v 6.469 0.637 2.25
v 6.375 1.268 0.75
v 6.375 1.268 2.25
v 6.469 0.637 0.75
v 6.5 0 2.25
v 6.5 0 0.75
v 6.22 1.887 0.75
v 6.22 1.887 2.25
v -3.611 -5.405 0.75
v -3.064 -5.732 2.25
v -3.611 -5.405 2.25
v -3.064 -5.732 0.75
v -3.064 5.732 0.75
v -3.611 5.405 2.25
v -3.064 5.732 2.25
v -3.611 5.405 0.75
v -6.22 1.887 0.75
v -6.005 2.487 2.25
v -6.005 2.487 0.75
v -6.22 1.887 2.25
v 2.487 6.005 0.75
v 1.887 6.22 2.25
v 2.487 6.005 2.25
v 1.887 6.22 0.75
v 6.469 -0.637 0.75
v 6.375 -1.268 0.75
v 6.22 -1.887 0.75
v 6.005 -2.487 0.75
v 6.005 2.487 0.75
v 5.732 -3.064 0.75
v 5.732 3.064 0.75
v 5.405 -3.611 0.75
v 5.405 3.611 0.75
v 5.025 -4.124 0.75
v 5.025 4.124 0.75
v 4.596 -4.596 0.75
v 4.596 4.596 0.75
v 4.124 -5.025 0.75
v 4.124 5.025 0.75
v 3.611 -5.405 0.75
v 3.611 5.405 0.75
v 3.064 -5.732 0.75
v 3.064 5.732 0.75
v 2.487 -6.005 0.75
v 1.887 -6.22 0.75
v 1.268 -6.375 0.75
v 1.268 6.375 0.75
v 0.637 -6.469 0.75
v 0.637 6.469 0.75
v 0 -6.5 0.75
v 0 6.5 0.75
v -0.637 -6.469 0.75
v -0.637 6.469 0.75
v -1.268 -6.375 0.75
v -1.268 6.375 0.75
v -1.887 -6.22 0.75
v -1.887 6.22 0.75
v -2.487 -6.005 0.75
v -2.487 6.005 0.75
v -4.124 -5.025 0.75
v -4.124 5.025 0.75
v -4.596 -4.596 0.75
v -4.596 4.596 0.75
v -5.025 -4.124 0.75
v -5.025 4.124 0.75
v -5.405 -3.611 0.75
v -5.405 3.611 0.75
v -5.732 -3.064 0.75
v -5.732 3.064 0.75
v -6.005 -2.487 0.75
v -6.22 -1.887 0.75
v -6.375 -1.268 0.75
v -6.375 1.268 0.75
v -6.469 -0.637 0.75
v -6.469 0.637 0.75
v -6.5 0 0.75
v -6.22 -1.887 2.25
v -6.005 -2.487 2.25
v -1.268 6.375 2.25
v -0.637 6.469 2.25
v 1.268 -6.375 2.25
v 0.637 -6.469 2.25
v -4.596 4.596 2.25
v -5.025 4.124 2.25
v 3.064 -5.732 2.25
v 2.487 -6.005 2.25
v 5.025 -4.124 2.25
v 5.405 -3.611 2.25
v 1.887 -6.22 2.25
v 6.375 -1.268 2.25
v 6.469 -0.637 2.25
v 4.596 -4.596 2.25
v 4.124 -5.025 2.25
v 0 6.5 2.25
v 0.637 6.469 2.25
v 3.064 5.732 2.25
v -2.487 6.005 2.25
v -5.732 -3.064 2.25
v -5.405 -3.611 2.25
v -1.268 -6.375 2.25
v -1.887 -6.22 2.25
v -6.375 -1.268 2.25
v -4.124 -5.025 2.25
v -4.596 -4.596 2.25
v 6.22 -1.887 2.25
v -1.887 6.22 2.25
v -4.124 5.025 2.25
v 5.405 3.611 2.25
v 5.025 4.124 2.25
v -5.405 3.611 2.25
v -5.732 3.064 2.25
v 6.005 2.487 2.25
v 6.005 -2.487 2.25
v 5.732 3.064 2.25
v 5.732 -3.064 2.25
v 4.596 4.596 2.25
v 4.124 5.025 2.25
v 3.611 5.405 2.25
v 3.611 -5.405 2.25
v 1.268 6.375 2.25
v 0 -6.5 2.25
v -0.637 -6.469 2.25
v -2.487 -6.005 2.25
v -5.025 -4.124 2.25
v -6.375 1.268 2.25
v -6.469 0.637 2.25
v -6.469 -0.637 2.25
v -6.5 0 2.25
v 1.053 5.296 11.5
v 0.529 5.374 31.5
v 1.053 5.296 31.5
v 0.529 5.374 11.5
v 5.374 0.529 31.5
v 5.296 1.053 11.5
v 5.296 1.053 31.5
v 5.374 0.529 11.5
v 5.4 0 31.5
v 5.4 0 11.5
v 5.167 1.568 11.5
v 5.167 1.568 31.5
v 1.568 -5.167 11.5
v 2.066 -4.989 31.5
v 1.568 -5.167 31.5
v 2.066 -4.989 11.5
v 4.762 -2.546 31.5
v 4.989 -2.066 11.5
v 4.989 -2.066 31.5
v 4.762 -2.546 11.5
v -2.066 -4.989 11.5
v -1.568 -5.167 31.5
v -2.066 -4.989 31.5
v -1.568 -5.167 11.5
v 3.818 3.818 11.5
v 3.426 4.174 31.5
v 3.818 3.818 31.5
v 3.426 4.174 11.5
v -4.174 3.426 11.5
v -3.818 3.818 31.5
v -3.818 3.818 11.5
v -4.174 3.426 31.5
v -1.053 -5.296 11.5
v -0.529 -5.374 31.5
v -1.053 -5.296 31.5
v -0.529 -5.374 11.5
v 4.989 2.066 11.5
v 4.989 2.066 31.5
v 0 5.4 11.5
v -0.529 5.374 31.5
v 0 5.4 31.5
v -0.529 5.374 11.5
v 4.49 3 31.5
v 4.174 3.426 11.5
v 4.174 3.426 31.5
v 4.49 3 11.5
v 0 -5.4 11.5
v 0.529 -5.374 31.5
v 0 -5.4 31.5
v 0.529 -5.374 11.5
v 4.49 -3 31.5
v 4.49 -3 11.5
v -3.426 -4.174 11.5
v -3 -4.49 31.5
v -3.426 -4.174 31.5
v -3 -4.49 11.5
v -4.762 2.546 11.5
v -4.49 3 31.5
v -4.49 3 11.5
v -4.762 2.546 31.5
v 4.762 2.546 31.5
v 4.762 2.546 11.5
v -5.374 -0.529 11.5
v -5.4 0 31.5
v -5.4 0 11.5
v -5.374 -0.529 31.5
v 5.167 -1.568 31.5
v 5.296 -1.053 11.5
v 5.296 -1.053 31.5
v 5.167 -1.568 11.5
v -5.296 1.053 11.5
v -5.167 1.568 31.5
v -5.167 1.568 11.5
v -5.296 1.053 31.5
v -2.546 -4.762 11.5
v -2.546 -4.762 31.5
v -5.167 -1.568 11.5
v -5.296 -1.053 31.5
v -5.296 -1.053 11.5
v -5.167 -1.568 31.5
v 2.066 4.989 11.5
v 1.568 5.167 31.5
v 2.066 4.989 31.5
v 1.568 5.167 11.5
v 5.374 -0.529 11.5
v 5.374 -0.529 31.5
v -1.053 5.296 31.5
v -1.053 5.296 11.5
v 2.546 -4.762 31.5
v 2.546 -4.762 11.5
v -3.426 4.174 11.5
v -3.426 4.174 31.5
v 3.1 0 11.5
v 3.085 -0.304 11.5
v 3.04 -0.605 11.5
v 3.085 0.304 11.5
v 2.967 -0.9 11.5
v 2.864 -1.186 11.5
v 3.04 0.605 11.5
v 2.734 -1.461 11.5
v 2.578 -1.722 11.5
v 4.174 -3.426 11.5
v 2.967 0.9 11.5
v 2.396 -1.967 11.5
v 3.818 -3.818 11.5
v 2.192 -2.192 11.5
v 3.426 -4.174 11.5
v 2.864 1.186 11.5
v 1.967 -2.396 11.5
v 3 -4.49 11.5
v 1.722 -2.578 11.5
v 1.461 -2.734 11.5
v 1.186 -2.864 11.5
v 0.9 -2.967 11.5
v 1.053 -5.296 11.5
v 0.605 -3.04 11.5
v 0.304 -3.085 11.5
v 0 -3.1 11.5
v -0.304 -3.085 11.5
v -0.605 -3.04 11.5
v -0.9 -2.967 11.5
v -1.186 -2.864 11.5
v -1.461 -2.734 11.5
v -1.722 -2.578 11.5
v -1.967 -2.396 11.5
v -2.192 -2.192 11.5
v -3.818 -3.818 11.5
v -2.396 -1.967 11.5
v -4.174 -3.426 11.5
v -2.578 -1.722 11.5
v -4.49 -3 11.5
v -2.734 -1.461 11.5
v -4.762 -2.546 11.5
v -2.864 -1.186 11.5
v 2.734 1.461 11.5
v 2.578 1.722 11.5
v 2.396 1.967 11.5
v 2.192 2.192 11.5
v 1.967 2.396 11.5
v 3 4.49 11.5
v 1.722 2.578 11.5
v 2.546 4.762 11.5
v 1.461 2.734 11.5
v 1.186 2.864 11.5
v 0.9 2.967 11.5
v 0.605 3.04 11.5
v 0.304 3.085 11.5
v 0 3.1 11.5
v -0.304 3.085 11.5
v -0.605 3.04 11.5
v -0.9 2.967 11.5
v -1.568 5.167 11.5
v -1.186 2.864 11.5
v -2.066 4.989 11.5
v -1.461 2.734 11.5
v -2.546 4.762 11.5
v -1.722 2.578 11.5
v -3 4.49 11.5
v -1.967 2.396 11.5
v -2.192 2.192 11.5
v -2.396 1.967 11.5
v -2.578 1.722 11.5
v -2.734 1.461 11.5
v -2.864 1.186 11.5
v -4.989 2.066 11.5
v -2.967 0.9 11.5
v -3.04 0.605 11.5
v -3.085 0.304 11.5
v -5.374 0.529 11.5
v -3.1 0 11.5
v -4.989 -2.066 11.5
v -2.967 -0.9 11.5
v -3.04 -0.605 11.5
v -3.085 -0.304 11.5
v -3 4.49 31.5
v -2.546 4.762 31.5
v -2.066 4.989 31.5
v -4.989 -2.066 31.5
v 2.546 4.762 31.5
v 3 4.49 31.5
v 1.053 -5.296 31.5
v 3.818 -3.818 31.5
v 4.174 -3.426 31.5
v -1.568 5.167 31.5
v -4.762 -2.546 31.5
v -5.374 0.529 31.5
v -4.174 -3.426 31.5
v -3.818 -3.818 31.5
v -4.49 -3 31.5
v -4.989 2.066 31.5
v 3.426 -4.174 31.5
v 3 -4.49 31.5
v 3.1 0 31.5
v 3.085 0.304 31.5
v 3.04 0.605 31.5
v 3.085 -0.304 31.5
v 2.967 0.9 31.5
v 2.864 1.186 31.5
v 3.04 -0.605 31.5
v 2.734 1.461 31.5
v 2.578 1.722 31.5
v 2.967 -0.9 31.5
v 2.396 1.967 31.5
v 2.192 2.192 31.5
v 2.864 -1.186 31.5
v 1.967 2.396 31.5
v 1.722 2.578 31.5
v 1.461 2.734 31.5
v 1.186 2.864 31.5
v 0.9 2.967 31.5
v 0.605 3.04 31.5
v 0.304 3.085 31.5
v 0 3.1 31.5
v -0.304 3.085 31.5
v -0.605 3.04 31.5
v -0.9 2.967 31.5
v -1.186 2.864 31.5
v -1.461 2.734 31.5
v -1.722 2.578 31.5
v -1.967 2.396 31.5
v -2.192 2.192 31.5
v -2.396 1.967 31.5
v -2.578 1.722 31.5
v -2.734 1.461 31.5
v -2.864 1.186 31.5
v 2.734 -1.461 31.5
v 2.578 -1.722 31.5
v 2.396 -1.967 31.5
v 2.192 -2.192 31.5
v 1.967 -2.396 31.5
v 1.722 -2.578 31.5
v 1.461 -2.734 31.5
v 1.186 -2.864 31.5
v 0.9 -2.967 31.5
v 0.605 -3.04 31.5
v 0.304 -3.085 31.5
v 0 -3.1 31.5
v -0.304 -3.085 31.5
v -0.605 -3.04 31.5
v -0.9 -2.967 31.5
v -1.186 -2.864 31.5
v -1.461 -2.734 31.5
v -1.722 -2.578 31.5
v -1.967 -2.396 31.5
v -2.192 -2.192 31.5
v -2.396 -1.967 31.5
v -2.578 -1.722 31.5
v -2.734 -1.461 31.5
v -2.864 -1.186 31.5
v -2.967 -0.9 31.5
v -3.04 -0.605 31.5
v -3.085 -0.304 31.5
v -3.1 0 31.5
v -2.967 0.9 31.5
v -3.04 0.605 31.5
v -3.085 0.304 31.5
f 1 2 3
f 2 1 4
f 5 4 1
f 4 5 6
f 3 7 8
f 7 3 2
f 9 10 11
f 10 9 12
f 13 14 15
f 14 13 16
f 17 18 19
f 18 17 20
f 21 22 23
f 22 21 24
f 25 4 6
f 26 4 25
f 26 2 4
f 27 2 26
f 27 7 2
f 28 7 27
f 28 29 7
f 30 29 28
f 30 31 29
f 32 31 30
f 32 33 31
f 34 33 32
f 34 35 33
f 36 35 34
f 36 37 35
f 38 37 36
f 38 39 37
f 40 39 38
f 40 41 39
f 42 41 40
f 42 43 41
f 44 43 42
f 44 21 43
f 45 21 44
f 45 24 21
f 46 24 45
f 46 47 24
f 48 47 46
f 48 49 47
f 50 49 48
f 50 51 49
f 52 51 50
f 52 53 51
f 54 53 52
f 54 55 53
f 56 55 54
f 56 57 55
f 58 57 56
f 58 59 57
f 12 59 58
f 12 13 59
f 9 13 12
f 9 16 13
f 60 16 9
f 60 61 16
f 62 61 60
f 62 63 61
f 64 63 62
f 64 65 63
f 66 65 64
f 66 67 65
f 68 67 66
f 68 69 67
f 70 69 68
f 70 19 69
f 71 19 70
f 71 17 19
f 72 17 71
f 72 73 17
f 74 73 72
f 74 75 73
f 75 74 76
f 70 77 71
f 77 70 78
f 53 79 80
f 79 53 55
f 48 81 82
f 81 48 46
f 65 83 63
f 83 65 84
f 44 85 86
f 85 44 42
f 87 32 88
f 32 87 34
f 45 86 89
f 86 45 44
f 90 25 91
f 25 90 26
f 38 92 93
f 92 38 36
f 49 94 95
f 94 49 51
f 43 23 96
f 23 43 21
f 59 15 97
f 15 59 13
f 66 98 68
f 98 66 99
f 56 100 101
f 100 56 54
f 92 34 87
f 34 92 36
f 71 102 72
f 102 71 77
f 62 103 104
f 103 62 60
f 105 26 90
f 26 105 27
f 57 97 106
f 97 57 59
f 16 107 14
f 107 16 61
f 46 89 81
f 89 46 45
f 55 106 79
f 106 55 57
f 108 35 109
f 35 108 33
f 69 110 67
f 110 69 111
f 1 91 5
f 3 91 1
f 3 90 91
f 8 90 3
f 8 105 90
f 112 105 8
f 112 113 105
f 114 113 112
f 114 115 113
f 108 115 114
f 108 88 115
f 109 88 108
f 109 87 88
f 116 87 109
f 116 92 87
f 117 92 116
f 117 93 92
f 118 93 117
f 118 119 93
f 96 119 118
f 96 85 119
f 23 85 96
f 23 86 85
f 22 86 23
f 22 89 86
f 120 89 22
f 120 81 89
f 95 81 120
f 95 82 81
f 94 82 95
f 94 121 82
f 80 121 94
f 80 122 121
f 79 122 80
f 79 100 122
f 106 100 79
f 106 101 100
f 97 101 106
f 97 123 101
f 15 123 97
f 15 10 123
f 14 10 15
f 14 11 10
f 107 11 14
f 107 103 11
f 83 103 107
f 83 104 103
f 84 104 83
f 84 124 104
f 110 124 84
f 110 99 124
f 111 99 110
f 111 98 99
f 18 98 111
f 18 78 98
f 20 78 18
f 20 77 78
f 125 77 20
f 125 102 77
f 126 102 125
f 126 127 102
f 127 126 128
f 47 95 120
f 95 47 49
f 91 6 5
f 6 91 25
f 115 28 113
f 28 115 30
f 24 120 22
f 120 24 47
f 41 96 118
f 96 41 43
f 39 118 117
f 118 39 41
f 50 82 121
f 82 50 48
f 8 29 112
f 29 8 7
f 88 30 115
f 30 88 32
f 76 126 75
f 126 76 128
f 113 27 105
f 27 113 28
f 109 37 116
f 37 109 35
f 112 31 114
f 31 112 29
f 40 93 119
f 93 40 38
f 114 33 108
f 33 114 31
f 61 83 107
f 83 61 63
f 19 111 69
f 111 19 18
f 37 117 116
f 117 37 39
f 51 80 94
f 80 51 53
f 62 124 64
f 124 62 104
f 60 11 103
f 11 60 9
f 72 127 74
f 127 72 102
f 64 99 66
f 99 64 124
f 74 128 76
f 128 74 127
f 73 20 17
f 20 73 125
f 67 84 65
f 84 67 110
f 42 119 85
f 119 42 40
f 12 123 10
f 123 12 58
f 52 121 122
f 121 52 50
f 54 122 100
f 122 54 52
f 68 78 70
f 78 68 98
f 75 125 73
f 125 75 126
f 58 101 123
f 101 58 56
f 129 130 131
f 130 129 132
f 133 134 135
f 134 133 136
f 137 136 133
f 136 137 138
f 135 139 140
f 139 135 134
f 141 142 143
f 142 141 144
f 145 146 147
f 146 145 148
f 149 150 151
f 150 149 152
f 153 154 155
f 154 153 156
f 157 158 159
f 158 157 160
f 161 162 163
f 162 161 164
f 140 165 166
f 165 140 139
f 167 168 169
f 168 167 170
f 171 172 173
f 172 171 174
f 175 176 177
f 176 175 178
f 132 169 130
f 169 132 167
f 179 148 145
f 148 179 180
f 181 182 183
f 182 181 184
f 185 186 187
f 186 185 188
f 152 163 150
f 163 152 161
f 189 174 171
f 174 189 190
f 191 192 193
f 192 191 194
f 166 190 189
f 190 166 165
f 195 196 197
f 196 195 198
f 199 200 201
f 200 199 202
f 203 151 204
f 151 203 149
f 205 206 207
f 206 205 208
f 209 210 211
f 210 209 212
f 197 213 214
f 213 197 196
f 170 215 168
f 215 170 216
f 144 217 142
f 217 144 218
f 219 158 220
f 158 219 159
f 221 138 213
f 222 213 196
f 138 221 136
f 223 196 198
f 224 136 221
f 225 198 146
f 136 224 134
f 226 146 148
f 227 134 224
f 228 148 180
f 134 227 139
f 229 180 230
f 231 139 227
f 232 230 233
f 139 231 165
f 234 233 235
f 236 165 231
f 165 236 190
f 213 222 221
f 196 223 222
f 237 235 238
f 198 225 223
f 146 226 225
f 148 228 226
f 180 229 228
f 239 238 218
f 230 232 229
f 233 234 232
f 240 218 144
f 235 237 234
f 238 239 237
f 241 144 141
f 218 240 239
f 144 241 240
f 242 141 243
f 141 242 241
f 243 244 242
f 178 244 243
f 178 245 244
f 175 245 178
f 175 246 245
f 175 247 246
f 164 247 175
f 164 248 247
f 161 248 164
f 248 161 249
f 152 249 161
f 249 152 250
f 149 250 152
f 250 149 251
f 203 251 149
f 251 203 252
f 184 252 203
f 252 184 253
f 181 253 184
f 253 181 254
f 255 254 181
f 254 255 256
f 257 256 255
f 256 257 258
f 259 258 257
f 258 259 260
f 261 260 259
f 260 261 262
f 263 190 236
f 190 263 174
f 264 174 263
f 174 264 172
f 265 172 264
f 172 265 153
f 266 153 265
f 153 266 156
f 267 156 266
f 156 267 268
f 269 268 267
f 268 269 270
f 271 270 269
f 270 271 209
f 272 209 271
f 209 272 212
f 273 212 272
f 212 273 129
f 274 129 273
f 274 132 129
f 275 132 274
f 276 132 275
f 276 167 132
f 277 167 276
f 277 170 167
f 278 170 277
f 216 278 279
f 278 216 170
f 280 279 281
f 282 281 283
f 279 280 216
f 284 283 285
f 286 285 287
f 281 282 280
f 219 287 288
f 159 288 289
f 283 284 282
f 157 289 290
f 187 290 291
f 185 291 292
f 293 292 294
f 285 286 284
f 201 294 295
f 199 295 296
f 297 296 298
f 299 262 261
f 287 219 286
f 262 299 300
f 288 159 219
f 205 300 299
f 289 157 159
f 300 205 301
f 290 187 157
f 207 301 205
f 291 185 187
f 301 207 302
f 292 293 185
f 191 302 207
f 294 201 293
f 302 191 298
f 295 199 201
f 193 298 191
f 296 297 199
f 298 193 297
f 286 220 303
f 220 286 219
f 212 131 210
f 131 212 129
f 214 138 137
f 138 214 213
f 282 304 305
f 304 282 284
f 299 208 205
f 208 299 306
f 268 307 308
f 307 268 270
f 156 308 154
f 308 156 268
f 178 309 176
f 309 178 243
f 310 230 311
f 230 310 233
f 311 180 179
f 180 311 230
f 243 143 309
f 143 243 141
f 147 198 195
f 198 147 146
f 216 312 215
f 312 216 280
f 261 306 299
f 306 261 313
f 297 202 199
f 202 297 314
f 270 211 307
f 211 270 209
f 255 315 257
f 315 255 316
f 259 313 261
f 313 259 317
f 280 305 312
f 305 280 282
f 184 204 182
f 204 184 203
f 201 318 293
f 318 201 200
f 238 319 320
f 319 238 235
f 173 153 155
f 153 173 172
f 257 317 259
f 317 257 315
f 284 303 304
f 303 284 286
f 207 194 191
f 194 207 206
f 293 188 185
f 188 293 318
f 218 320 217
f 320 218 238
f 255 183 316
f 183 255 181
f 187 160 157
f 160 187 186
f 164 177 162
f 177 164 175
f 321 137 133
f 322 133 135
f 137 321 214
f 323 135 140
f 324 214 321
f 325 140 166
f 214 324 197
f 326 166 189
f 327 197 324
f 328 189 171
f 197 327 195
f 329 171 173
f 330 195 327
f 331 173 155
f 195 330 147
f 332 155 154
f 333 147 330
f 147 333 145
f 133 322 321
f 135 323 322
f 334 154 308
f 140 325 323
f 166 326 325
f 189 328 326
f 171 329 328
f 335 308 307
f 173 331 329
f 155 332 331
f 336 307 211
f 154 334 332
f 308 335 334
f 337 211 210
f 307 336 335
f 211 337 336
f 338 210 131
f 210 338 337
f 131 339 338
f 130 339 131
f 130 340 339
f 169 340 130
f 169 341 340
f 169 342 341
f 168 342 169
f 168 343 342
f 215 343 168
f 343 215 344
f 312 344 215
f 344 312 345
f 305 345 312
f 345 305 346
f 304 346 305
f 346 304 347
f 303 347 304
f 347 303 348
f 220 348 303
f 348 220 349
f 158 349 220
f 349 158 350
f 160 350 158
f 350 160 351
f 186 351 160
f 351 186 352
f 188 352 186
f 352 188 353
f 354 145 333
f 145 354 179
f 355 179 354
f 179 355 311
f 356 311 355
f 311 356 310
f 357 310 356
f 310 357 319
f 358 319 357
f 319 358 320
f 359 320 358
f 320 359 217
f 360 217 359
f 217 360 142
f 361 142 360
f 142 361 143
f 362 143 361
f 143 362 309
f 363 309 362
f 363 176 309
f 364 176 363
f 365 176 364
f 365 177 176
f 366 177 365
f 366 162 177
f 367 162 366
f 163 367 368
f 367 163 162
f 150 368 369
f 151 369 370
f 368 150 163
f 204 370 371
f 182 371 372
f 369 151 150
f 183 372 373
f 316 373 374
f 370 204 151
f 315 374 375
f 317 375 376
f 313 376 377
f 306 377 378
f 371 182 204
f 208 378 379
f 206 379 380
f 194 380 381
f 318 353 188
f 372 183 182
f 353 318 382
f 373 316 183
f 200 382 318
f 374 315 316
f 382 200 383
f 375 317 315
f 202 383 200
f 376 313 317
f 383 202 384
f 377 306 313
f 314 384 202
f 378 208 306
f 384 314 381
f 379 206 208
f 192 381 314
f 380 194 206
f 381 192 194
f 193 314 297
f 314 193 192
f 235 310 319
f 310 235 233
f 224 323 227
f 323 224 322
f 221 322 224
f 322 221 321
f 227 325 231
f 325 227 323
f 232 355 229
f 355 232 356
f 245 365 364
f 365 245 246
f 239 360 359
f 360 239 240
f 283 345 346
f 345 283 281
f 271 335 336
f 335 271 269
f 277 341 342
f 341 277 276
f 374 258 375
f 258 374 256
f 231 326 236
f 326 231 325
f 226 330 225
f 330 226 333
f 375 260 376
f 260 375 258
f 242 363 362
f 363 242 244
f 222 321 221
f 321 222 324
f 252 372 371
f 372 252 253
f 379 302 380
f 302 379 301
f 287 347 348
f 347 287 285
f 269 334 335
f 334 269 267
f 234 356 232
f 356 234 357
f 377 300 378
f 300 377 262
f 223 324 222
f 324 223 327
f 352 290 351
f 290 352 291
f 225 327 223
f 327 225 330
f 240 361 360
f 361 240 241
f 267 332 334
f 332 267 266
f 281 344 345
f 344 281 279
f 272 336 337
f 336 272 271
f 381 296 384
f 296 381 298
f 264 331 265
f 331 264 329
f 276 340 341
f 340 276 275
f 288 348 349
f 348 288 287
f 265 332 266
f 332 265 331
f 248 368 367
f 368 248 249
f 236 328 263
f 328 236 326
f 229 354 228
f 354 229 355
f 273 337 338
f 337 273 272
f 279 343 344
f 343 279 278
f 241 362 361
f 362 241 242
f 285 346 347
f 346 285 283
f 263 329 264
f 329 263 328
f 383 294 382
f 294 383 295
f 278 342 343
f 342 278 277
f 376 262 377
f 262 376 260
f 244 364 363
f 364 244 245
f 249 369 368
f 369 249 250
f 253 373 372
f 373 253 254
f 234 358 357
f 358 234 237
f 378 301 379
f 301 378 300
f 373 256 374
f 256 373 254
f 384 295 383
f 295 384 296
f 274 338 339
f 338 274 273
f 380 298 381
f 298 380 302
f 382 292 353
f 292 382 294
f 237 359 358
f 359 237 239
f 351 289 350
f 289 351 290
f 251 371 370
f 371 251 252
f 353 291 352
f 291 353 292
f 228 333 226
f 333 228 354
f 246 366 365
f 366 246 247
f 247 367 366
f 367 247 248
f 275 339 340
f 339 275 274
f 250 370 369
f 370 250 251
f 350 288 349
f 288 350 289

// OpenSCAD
// Adapter sleeve for 0.2 mL PCR tube in 1.5 mL rack
// Print orientation: Collar on bed (Z=0), Sleeve body rising up.

// --- Dimensions (mm) ---
// Collar dimensions (lying on bed)
$collar_diameter = 13;
$collar_thickness = 1.5;

// Sleeve body dimensions (rising from collar)
// Outer diameter of the sleeve body
$sleeve_outer_diameter = 10.8;
// Total height of the part (Collar + Body)
$total_height = 21.5;

// Bore dimensions
$bore_diameter = 6.2;

// --- Configuration ---
$fn = 64; // High resolution for smooth holes and cylinders

module adapter_sleeve() {
    // Calculate derived heights
    $collar_height = $collar_thickness;
    $sleeve_body_height = $total_height - $collar_height;
    
    // Calculate radii
    $collar_radius = $collar_diameter / 2;
    $sleeve_outer_radius = $sleeve_outer_diameter / 2;
    $bore_radius = $bore_diameter / 2;
    
    // Center of the part is at (0,0,0)
    // The collar sits from z=0 to z=$collar_height
    // The sleeve body sits from z=$collar_height to z=$total_height
    
    difference() {
        // --- Main Body (Union of Collar and Sleeve) ---
        union() {
            // 1. The Collar (Lying on the bed, z=0 to z=1.5)
            // Cylinder centered at (0,0, $collar_height/2)
            translate([0, 0, $collar_height/2]) {
                cylinder(
                    h = $collar_height,
                    r = $collar_radius,
                    $fn = $fn
                );
            }
            
            // 2. The Sleeve Body (Rising from the collar, z=1.5 to z=21.5)
            // Cylinder centered at (0,0, $collar_height + $sleeve_body_height/2)
            translate([0, 0, $collar_height + $sleeve_body_height/2]) {
                cylinder(
                    h = $sleeve_body_height,
                    r = $sleeve_outer_radius,
                    $fn = $fn
                );
            }
        }
        
        // --- Bore (Hole through the center) ---
        // The hole runs through the full height ($total_height)
        // Centered at (0,0, $total_height/2)
        translate([0, 0, $total_height/2]) {
            cylinder(
                h = $total_height,
                r = $bore_radius,
                $fn = $fn
            );
        }
    }
}

// Render the part
adapter_sleeve();
